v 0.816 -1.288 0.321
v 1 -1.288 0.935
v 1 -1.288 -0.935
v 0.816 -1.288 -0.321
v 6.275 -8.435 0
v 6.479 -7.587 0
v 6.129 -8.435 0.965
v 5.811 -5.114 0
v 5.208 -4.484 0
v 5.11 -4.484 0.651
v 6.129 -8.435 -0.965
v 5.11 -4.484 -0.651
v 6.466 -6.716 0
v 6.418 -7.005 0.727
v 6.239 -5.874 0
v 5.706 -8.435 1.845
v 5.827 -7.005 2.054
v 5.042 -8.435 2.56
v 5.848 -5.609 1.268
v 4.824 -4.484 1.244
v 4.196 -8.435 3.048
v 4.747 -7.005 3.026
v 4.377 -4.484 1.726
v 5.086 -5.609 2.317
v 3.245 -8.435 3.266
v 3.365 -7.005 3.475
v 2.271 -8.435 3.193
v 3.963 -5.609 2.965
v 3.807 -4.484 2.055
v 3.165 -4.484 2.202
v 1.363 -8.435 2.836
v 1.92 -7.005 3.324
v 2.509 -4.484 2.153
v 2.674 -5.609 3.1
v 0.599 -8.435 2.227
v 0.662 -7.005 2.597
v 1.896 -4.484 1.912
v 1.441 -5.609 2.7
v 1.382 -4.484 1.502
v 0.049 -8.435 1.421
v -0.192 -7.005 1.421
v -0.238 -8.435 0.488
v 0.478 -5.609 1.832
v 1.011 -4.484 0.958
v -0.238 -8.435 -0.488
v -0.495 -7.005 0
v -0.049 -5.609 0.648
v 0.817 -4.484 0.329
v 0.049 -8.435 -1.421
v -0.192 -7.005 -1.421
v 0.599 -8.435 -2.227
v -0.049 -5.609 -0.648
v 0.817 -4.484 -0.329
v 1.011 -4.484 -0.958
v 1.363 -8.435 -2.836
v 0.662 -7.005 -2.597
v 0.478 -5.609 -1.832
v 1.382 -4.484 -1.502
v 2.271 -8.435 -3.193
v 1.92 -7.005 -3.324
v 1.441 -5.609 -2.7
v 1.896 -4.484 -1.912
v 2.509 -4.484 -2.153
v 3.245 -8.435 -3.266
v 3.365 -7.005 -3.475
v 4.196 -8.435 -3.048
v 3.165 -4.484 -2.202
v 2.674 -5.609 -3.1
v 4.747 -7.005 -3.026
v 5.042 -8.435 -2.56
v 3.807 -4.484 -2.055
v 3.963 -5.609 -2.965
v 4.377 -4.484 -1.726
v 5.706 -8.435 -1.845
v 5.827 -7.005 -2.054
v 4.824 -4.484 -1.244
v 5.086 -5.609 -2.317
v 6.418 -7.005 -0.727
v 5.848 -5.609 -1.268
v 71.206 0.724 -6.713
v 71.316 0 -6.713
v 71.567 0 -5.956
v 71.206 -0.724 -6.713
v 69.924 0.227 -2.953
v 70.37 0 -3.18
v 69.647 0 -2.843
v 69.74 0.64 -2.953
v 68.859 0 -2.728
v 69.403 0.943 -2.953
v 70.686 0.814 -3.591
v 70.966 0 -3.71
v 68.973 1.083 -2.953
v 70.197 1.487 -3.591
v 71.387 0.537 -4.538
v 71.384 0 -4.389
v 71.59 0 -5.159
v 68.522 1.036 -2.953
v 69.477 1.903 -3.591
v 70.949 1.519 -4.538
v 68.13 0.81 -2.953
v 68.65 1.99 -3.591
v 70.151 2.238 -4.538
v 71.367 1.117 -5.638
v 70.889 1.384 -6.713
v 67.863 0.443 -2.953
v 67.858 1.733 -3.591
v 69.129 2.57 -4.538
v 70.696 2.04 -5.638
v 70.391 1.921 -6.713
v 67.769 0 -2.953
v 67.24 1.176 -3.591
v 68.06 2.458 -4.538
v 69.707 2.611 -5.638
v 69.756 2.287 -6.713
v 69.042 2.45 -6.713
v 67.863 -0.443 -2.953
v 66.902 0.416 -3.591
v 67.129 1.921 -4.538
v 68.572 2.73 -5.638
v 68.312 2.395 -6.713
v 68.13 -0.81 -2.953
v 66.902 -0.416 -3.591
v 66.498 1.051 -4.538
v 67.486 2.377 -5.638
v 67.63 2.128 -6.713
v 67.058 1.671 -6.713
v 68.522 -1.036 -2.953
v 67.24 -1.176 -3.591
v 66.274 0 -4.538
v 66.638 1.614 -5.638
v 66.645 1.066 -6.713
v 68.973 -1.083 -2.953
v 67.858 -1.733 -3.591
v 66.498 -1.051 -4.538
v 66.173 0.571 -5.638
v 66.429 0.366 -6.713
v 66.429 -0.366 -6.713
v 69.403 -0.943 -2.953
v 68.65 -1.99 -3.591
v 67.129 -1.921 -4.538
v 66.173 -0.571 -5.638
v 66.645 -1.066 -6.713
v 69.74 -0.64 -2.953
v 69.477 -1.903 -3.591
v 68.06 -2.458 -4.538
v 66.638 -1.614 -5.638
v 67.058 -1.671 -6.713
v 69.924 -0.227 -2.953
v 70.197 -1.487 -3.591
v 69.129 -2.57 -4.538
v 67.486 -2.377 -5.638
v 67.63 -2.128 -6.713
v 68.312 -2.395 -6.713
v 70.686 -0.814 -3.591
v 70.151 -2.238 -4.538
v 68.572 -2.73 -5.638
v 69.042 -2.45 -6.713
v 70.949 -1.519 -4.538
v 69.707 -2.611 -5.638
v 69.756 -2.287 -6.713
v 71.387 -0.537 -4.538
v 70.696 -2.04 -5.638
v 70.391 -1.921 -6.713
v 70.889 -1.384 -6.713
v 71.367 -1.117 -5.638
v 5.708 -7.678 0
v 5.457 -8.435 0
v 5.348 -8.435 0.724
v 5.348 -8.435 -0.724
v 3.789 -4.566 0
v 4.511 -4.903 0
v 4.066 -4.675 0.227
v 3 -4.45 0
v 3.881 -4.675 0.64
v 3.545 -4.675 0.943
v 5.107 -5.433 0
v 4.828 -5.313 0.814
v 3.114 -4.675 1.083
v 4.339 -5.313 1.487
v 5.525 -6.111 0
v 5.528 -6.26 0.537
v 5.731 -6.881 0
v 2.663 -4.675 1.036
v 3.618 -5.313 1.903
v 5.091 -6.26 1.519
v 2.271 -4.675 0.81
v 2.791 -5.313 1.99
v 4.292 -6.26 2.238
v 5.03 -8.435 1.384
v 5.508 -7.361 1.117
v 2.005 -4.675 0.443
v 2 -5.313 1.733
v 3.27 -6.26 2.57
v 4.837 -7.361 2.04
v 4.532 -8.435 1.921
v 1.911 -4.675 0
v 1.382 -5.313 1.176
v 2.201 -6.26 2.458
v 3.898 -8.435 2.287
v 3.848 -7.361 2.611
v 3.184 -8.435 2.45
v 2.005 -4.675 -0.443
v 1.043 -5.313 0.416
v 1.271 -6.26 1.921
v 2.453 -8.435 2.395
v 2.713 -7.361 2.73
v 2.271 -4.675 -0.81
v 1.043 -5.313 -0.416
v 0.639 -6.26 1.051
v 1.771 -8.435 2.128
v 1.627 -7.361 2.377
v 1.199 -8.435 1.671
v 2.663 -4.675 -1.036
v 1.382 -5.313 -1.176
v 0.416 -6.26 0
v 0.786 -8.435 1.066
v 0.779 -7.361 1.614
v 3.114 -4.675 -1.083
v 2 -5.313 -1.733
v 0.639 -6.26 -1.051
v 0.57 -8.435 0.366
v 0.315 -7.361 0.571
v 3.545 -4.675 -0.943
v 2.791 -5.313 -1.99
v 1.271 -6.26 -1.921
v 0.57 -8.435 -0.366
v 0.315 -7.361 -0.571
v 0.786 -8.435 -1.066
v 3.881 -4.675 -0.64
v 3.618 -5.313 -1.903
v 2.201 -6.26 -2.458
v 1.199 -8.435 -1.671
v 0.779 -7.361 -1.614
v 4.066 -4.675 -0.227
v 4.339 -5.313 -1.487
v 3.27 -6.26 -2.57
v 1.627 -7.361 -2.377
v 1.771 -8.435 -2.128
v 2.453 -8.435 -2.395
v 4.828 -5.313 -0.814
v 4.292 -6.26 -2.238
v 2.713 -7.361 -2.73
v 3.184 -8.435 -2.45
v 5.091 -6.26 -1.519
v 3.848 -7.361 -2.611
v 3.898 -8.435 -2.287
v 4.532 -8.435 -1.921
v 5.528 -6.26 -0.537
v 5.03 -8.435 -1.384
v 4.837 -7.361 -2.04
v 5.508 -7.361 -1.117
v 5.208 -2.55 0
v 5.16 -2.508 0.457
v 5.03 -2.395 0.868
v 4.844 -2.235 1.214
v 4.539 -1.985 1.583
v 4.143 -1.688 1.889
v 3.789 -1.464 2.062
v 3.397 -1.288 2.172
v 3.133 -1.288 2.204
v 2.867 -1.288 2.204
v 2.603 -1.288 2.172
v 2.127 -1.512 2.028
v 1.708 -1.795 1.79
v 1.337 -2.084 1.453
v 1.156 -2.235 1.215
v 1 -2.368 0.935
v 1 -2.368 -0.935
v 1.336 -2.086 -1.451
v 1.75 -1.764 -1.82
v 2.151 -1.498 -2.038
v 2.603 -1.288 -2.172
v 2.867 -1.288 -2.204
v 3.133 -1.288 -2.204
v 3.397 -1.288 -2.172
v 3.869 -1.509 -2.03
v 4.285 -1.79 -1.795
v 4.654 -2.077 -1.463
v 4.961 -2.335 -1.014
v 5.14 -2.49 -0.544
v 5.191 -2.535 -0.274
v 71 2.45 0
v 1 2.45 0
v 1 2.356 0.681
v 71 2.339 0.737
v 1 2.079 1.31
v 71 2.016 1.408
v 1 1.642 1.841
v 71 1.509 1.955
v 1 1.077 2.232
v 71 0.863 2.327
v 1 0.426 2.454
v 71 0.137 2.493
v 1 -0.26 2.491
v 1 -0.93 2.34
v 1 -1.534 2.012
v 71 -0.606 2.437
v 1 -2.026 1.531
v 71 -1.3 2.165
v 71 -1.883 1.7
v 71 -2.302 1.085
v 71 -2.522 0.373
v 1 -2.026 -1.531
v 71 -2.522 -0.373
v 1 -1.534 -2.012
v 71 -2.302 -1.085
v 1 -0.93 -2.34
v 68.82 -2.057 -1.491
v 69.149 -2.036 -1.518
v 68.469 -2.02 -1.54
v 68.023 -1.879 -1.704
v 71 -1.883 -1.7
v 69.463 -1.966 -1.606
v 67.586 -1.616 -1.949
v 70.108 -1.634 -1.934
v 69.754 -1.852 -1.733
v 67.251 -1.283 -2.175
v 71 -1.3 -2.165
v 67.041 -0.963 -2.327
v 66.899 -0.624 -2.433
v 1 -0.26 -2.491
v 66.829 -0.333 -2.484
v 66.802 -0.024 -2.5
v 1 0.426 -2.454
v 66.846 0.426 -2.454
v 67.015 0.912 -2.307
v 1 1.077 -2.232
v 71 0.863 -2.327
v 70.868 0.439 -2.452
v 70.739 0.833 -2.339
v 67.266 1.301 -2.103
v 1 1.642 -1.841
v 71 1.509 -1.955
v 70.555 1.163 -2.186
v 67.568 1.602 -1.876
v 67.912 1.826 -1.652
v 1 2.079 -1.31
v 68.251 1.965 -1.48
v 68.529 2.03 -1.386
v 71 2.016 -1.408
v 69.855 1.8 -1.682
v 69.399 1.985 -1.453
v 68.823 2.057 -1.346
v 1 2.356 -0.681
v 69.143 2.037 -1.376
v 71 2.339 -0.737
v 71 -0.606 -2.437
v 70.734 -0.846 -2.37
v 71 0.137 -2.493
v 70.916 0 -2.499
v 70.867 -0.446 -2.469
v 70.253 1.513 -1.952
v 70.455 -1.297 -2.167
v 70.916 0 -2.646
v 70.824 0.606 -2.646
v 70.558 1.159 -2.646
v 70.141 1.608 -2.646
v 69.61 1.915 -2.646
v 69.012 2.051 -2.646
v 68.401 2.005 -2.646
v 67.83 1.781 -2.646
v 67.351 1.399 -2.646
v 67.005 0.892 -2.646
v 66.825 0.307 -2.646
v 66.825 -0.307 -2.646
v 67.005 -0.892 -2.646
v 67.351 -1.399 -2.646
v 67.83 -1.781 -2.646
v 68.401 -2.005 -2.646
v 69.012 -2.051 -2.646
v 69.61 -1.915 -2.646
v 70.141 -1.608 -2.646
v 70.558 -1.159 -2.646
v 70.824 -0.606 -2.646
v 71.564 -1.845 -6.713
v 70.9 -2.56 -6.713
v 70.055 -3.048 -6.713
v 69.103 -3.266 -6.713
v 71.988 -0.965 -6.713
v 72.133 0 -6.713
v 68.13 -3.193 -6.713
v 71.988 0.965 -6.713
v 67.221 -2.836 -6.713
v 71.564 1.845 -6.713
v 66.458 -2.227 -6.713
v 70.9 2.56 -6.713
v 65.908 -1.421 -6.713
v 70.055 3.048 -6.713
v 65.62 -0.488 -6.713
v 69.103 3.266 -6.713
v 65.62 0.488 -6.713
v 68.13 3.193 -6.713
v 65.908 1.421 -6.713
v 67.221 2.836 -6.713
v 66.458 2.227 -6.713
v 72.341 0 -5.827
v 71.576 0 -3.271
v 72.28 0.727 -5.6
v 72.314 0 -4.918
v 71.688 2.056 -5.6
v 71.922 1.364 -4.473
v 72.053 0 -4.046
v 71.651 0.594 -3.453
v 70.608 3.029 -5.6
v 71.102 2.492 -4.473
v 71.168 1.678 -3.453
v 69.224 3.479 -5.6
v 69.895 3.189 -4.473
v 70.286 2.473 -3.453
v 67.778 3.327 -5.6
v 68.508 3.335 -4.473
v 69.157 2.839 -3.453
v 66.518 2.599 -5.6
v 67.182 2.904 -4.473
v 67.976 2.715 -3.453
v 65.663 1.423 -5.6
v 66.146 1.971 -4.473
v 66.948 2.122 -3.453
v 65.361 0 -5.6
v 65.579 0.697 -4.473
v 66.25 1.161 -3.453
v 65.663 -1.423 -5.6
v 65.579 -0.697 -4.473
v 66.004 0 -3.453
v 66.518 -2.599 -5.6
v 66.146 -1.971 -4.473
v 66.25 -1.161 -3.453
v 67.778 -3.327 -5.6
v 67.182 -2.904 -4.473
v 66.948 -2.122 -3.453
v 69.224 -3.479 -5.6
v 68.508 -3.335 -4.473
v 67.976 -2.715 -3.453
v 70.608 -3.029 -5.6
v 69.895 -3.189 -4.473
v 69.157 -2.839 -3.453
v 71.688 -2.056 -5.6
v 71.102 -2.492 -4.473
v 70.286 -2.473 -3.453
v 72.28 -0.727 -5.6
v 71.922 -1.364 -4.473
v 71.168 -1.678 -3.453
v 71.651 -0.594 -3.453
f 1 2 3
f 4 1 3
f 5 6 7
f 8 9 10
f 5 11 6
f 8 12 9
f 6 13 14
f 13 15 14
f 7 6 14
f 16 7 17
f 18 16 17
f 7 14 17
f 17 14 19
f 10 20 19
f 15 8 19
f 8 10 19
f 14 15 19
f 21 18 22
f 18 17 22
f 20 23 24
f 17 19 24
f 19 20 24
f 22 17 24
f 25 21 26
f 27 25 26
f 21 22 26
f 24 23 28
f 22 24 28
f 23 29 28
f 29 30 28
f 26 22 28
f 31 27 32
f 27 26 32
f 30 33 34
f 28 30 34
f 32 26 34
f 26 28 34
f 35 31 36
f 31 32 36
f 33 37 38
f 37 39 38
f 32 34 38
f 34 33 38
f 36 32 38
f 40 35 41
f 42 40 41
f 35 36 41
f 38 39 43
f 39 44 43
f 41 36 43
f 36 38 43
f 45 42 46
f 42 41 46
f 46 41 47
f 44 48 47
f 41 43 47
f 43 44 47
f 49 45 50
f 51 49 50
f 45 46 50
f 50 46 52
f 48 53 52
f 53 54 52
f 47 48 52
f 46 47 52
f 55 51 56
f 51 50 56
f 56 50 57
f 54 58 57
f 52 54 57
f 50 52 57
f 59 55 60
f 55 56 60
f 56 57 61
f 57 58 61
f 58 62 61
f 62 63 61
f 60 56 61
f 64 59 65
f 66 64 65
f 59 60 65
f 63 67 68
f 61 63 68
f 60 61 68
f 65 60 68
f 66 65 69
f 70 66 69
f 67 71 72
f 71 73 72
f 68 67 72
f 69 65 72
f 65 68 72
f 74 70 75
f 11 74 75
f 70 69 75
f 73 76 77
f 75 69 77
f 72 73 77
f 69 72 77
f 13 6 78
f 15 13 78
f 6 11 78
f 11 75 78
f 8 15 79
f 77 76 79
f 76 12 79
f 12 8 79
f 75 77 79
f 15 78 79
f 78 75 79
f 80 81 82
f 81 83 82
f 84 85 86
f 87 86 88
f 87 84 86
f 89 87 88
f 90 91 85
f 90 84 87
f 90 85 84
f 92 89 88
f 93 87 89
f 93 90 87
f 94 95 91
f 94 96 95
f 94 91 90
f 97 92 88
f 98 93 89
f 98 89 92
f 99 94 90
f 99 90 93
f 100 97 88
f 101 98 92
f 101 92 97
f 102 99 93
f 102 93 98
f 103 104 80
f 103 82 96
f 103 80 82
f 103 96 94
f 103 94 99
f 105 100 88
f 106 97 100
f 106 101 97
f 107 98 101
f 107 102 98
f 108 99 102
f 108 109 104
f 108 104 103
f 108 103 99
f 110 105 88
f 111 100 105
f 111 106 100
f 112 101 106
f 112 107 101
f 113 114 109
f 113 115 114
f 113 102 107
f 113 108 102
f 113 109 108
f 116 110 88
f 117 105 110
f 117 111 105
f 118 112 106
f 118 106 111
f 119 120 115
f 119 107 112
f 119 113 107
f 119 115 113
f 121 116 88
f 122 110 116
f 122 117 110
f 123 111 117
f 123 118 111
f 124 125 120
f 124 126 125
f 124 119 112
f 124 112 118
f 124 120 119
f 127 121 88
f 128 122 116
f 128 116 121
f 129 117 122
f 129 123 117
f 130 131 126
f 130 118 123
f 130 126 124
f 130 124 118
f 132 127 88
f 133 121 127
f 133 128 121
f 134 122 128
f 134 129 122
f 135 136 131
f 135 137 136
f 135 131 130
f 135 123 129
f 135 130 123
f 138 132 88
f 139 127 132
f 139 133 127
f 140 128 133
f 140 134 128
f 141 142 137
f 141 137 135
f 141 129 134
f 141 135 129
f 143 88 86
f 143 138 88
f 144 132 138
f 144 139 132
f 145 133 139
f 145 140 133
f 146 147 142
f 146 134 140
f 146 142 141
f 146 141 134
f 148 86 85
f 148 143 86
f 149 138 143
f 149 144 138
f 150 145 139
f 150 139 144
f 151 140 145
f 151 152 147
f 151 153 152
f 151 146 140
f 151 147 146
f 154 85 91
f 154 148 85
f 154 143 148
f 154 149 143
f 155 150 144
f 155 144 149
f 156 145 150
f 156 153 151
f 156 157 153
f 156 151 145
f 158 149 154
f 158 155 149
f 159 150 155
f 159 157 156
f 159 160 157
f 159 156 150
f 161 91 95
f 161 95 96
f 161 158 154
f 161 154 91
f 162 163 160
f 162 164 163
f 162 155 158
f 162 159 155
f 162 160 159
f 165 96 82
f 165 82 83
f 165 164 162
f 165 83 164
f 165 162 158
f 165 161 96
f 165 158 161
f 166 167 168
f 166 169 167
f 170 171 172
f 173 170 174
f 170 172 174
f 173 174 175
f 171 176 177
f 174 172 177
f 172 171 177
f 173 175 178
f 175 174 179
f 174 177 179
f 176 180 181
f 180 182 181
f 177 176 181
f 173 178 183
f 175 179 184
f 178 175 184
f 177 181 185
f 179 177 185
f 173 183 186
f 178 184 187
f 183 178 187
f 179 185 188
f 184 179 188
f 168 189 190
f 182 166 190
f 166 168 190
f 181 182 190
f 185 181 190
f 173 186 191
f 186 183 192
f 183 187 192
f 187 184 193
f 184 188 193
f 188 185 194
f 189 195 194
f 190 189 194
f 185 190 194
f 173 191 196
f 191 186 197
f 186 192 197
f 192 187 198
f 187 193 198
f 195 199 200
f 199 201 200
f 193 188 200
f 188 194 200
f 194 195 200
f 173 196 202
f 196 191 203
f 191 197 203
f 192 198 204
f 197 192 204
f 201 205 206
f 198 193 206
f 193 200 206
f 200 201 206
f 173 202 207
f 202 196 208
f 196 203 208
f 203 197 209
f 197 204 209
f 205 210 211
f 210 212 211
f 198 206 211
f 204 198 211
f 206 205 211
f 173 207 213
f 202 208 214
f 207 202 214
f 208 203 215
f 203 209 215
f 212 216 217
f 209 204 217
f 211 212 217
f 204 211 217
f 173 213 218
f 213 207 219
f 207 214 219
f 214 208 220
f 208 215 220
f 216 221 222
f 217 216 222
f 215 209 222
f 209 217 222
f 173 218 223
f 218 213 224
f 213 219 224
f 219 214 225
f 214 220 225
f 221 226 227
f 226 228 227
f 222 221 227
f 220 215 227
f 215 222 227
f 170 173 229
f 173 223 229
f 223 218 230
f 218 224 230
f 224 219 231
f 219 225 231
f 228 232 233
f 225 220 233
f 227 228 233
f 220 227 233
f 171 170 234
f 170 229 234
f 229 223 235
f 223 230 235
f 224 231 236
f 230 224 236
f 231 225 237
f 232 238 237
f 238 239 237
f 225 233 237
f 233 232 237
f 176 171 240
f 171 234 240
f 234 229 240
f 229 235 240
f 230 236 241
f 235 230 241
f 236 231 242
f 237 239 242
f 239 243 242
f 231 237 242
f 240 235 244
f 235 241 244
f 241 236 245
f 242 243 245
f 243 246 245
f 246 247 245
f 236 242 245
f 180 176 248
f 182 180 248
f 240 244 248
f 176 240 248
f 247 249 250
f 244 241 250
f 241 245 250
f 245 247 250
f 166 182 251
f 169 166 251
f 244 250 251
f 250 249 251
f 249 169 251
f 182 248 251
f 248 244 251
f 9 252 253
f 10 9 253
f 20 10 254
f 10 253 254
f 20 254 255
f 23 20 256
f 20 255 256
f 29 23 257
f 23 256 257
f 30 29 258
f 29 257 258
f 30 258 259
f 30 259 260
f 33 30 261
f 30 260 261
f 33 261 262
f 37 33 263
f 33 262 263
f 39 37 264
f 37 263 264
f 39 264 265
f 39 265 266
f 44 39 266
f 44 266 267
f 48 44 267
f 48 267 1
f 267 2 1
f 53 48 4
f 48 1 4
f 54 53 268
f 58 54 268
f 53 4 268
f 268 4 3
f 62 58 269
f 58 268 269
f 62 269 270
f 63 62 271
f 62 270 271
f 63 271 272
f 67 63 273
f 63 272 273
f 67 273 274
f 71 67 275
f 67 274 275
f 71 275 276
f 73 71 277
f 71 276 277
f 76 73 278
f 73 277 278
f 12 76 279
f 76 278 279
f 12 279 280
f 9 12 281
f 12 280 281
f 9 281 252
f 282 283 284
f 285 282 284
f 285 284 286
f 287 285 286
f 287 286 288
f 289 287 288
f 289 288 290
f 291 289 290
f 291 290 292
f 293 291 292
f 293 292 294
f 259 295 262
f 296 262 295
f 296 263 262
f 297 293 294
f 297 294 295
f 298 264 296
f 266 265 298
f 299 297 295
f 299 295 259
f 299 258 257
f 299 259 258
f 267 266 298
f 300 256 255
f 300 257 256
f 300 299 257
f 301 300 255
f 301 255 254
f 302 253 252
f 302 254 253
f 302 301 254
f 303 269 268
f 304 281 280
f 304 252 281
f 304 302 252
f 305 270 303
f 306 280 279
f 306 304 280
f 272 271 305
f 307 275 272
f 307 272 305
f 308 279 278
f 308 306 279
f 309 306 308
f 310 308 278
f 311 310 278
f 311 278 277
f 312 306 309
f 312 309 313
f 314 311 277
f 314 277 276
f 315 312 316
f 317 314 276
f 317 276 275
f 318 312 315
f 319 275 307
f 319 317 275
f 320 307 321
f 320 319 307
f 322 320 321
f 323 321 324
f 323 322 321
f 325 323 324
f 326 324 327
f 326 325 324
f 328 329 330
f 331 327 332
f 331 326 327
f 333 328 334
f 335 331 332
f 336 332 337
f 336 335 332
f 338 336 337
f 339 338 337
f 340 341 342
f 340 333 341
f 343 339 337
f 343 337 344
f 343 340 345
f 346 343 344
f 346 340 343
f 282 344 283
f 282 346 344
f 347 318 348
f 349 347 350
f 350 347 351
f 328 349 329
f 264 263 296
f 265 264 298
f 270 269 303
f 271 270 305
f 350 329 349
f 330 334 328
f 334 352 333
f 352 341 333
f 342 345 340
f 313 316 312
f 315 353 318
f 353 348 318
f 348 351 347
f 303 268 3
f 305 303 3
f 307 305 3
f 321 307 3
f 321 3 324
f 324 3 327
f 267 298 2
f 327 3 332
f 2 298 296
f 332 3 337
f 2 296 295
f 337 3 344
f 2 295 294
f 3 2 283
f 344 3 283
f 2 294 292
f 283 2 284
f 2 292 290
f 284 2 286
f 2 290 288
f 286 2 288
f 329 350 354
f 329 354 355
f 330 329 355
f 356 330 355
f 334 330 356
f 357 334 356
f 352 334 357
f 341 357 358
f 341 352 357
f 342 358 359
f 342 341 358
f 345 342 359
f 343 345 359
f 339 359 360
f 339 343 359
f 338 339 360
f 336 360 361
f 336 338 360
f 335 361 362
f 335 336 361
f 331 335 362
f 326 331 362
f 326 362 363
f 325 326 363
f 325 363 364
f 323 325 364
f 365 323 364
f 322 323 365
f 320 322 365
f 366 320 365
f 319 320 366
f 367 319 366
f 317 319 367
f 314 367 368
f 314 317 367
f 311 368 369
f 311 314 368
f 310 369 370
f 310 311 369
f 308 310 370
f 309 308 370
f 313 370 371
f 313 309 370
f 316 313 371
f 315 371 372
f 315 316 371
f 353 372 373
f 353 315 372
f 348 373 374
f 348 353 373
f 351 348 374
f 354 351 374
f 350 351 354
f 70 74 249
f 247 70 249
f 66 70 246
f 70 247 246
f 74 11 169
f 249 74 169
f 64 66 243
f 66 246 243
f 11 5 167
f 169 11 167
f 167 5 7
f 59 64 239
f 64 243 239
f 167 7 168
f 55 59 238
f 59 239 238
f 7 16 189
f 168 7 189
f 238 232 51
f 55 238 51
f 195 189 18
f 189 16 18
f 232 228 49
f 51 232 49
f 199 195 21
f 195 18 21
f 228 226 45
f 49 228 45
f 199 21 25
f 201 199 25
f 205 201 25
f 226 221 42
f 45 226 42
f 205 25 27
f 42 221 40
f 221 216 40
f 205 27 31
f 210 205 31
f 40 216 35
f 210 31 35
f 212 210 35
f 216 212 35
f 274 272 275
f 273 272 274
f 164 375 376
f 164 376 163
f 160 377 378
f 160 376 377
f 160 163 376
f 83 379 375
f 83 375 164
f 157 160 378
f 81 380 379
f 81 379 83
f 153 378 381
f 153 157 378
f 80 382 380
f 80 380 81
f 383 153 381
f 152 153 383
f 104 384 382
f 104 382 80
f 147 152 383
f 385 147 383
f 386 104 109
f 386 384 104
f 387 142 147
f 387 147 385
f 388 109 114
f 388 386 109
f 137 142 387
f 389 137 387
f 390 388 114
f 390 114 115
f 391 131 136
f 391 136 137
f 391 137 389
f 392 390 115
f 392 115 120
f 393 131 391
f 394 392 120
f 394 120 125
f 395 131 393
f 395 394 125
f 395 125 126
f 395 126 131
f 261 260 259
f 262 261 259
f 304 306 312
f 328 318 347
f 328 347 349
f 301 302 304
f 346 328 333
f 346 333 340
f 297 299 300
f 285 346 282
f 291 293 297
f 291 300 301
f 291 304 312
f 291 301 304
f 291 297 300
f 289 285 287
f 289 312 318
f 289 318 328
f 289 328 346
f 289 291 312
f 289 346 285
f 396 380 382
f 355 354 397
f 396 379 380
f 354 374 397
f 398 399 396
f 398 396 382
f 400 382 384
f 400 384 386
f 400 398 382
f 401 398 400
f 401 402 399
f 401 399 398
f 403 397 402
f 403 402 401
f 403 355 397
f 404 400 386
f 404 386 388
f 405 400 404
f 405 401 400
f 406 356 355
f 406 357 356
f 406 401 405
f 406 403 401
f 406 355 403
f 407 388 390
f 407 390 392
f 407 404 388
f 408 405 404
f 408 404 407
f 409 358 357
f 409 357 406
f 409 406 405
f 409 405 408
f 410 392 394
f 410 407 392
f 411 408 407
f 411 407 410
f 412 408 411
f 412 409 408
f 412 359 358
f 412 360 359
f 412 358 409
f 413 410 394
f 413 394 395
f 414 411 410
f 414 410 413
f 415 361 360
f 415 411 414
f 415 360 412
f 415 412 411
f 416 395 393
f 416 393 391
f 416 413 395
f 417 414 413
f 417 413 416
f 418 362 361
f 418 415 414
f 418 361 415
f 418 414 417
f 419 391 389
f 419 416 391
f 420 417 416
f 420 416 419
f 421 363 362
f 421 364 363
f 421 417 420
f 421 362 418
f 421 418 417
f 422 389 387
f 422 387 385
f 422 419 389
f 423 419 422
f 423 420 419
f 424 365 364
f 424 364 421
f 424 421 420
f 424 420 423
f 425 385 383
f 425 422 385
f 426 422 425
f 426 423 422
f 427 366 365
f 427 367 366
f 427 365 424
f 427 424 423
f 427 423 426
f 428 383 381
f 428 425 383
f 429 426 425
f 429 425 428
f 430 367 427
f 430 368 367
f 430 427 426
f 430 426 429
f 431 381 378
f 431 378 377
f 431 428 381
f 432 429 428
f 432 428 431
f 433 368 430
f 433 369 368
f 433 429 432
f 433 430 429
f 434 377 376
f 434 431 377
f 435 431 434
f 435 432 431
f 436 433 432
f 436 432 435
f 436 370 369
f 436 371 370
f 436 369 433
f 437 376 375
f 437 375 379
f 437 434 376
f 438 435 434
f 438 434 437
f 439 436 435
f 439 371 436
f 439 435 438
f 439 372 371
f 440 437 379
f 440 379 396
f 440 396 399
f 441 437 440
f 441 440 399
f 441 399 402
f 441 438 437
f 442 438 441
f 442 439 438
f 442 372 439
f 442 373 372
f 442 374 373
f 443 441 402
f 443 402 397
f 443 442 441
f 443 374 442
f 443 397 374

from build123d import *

# Parameters (mm, degrees)
F3_R     = 2.5
F4_DEPTH = 35


with BuildPart() as f1:
    # F0 (on Top) → F1 (revolve)
    with BuildSketch(Plane.XY):
        with BuildLine():
            ThreePointArc((3, 2.75), (5.3408484106, 1.4432355034), (5.4570149341, -1.2351427503))
            Line((5.4570149341, -1.2351427503), (6.2748163897, -1.2351427503))
            ThreePointArc((6.2748163897, -1.2351427503), (6.378961338, 0.9124802881), (5.2078915499, 2.7157346895))
            ThreePointArc((5.2078915499, 2.7157346895), (4.1715222121, 3.29811093), (3, 3.5))
            Line((3, 3.5), (3, 2.75))
        make_face()
        with BuildLine():
            Line((3, 5.9120398946), (3, 3.5))
            ThreePointArc((3, 3.5), (4.1715222121, 3.29811093), (5.2078915499, 2.7157346895))
            Line((5.2078915499, 2.7157346895), (5.2078915499, 5.9120398946))
            Line((5.2078915499, 5.9120398946), (3, 5.9120398946))
        make_face()
    revolve(axis=Axis((3, -1.5105393408, 0), (0, -1, 0)))

    # F3 (on offset) → F4 (join, symmetric)
    with BuildSketch(Plane.YZ.offset(36)):
        with Locations((7.1499980986, 0)):
            Circle(F3_R)
    extrude(amount=F4_DEPTH, both=True)


with BuildPart() as f1_1:
    # F5: moved
    add(f1.part.moved(Location((0, -7.2, 0))))

    # F6 (on Front) → F7 (revolve)
    with BuildSketch(Plane.XZ):
        with BuildLine():
            ThreePointArc((68.8586309552, -2.7275545988), (71.1994793659, -4.0343190953), (71.3156458893, -6.712697349))
            Line((71.3156458893, -6.712697349), (72.133447345, -6.712697349))
            ThreePointArc((72.133447345, -6.712697349), (72.2115181091, -4.4734889968), (70.9155485965, -2.64575485))
            ThreePointArc((70.9155485965, -2.64575485), (69.9399960368, -2.148793634), (68.8586309552, -1.9775545988))
            Line((68.8586309552, -1.9775545988), (68.8586309552, -2.7275545988))
        make_face()
        with BuildLine():
            Line((68.8586309552, 0.4344852958), (68.8586309552, -1.9775545988))
            ThreePointArc((68.8586309552, -1.9775545988), (69.9399960368, -2.148793634), (70.9155485965, -2.64575485))
            Line((70.9155485965, -2.64575485), (70.9155485965, 0.4344852958))
            Line((70.9155485965, 0.4344852958), (68.8586309552, 0.4344852958))
        make_face()
    revolve(axis=Axis((68.8586309552, 0, -3.7275545988), (0, 0, 1)))


solid = f1_1.part
